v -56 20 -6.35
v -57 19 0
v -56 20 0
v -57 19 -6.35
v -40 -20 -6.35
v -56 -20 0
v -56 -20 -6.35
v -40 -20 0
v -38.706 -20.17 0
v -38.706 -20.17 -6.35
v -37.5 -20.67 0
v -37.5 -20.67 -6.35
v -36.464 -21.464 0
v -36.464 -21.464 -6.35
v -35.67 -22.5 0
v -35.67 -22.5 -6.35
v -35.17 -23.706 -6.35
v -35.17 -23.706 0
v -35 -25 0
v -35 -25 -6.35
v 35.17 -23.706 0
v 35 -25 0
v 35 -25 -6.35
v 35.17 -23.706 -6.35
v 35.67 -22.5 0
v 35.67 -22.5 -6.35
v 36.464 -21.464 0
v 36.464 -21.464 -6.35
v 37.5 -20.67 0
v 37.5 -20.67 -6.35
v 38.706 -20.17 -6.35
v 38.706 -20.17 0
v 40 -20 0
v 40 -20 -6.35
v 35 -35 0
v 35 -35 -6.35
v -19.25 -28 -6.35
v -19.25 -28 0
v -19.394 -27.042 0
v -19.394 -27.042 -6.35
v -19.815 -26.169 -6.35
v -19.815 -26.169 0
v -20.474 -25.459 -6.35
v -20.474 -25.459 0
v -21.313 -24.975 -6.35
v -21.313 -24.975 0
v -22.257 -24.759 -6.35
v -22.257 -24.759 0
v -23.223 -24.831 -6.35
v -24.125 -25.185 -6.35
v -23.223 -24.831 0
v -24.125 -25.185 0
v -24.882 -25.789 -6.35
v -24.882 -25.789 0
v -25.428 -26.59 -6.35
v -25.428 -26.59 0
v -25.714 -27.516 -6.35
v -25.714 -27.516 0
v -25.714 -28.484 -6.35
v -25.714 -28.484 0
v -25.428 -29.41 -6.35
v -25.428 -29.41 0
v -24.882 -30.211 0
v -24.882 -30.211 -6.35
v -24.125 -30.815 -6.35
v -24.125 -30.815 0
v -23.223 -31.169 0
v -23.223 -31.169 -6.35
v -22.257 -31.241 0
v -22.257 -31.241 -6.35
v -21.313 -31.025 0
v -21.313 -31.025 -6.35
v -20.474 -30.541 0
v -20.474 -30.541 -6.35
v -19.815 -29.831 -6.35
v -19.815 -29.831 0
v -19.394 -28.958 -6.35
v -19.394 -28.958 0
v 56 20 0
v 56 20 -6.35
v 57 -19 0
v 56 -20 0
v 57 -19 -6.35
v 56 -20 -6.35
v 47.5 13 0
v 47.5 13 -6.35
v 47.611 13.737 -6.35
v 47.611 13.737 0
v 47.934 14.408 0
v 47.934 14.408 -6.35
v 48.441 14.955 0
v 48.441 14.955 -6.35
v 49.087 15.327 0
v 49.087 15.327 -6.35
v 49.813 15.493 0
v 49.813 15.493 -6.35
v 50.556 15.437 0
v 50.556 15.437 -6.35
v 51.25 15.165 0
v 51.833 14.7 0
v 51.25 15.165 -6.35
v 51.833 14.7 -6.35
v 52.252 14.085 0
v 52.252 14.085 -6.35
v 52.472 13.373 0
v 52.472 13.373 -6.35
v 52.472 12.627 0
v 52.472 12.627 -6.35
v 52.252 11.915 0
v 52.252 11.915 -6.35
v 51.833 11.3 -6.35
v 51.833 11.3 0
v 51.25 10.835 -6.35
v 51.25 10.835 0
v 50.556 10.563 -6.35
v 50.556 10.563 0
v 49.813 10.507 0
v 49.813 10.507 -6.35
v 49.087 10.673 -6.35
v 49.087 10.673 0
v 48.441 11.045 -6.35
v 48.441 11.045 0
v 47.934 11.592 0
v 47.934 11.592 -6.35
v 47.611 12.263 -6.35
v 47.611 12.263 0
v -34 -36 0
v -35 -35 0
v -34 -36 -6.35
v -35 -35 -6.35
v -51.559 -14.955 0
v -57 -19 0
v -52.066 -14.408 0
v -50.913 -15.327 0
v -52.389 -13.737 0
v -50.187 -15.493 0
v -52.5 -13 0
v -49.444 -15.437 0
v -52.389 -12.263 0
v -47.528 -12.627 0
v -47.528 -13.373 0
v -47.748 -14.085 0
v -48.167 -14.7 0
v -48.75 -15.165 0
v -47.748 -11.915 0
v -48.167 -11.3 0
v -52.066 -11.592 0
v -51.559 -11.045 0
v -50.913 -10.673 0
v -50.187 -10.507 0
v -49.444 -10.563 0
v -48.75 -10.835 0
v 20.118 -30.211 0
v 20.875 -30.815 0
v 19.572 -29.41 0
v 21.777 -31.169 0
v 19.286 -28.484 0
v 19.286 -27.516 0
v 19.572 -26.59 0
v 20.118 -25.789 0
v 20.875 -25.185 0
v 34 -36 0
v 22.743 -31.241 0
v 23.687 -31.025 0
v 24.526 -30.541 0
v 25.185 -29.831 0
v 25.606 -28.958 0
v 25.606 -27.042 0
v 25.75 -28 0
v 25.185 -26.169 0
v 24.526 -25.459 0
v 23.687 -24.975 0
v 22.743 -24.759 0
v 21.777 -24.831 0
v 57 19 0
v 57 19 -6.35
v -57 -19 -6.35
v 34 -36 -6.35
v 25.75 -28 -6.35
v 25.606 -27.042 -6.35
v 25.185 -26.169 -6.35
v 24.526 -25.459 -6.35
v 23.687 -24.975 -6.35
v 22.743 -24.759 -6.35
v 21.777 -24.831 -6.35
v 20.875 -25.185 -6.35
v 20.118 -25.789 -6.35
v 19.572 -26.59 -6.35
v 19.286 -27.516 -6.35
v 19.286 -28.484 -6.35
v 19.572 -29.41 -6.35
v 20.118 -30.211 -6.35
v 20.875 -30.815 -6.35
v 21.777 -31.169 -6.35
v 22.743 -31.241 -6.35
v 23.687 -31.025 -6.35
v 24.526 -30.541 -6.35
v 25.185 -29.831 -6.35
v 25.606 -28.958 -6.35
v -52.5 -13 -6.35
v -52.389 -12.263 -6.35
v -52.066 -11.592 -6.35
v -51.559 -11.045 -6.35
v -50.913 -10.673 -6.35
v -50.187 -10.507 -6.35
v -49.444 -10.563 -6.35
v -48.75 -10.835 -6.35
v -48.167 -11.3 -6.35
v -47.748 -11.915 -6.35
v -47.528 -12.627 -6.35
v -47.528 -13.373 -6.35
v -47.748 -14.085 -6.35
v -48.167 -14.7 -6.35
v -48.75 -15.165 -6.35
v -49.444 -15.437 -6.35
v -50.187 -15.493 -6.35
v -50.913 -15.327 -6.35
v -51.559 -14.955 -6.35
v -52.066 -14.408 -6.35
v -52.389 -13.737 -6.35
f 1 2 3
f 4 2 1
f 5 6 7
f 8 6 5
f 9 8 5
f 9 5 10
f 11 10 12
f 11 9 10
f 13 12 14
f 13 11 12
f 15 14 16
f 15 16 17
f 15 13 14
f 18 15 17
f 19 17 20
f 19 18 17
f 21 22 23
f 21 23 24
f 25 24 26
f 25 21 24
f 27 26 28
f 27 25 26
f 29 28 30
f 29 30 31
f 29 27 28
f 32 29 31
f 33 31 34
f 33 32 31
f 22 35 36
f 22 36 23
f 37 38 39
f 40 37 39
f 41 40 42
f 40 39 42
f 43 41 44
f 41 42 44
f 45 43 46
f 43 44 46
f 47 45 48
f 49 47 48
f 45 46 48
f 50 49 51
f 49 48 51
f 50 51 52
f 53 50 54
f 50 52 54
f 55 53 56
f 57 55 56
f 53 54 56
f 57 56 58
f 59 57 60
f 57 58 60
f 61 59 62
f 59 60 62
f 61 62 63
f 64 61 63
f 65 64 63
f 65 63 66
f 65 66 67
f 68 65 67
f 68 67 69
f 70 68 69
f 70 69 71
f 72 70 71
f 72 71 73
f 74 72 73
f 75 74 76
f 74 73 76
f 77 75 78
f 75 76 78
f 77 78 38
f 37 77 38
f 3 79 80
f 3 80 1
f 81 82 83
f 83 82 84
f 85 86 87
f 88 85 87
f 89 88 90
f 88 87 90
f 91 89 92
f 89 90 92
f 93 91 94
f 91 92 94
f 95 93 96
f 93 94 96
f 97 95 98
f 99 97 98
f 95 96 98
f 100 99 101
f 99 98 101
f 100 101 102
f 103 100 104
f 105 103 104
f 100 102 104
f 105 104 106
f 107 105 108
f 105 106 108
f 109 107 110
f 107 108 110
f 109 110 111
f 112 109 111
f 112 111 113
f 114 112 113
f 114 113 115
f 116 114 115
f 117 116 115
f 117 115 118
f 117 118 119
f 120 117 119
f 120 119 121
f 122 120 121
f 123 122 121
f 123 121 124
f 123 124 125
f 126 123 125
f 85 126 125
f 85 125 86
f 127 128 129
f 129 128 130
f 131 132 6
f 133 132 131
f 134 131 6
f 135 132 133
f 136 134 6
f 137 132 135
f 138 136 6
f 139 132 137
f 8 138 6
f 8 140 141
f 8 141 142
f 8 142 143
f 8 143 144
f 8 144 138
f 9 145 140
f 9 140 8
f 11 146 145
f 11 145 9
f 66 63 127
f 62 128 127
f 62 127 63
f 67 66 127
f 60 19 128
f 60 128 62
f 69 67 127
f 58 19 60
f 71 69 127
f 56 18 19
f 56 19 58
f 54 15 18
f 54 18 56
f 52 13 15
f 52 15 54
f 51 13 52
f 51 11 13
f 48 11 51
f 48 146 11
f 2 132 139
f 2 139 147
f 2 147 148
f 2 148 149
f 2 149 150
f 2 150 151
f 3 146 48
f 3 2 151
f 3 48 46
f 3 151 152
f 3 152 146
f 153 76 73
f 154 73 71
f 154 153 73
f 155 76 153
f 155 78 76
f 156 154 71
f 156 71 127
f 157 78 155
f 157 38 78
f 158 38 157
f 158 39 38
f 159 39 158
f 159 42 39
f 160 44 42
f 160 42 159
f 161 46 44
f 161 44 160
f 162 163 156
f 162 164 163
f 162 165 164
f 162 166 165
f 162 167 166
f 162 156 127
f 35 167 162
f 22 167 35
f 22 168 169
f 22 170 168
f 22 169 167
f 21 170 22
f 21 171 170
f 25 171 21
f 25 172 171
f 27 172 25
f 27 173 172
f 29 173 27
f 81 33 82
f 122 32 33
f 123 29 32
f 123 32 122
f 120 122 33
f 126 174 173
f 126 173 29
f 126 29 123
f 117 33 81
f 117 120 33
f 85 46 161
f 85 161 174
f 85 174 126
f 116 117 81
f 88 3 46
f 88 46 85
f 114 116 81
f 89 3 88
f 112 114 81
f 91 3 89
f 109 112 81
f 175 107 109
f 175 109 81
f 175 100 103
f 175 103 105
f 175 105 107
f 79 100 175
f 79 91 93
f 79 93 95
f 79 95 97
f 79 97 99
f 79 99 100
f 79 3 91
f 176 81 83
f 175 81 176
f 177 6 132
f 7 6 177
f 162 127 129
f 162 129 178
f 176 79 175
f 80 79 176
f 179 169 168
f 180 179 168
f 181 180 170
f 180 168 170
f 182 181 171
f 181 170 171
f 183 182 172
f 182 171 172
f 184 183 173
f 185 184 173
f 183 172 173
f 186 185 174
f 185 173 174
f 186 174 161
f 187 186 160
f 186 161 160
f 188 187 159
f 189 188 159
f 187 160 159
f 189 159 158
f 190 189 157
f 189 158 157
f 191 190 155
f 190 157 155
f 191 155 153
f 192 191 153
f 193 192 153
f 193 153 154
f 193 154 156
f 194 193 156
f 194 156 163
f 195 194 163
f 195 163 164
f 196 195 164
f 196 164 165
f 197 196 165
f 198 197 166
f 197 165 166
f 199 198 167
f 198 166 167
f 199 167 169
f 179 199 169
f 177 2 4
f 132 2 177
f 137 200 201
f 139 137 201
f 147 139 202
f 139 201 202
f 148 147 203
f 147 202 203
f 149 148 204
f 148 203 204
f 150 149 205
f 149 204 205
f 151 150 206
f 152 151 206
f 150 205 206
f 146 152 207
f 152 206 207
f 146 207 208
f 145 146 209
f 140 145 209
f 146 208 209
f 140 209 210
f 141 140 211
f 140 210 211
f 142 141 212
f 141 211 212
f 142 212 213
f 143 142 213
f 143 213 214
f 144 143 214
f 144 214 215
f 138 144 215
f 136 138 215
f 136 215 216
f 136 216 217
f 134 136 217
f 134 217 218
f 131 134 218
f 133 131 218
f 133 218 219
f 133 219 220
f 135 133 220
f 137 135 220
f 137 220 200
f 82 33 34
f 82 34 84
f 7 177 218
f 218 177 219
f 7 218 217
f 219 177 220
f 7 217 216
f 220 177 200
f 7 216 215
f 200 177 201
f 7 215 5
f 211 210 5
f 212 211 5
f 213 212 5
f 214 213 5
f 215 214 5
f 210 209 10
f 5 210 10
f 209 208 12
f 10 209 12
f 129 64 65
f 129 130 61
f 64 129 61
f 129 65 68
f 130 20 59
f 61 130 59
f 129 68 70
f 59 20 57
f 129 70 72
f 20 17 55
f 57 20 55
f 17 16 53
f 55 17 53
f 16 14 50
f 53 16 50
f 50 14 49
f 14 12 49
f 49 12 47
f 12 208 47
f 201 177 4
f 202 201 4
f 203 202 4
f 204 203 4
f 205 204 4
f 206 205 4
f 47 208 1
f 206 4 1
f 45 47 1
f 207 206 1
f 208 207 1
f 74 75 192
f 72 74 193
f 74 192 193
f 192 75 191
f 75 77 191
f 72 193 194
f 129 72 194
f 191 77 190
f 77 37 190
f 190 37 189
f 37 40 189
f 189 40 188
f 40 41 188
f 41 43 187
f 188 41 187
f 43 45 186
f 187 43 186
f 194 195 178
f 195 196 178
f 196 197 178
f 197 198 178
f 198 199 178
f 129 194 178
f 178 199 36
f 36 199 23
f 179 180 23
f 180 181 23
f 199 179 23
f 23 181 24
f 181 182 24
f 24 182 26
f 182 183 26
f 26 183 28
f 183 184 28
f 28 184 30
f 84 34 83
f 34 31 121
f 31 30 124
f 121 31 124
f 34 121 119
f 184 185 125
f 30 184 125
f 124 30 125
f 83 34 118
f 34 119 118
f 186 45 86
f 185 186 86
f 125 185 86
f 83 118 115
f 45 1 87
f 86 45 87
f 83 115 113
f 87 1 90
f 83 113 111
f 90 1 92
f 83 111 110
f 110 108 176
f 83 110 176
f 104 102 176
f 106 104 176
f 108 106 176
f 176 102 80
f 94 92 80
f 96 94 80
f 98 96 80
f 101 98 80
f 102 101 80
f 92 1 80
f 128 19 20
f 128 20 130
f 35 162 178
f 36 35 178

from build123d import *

# Parameters (mm, degrees)
F0_R     = 3.25
F1_DEPTH = 6.35
F2_SIZE  = 1
F3_D     = 5


with BuildPart() as f1:
    # F0 (on Top) → F1 (new body)
    with BuildSketch(Plane.XY):
        with BuildLine():
            Line((57, -20), (57, 20))
            Line((57, 20), (-57, 20))
            Line((-57, 20), (-57, -20))
            Line((-57, -20), (-40, -20))
            ThreePointArc((-40, -20), (-36.4644660941, -21.4644660941), (-35, -25))
            Line((-35, -25), (-35, -36))
            Line((-35, -36), (35, -36))
            Line((35, -36), (35, -25))
            ThreePointArc((35, -25), (36.4644660941, -21.4644660941), (40, -20))
            Line((40, -20), (57, -20))
        make_face()
        with Locations((-22.5, -28)):
            Circle(F0_R, mode=Mode.SUBTRACT)
        with Locations((22.5, -28)):
            Circle(F0_R, mode=Mode.SUBTRACT)
    extrude(amount=-F1_DEPTH)

    # F2
    f2_edges = [f1.edges().sort_by_distance(p)[0] for p in [
        (-35, -36, -3.175),
        (-57, -20, -3.175),
        (35, -36, -3.175),
        (57, -20, -3.175),
        (-57, 20, -3.175),
        (57, 20, -3.175),
    ]]
    chamfer(f2_edges, length=F2_SIZE)

    # F3 (through all)
    with Locations(Plane.XY):
        with Locations((-50, -13), (50, 13)):
            Hole(F3_D / 2)


solid = f1.part
